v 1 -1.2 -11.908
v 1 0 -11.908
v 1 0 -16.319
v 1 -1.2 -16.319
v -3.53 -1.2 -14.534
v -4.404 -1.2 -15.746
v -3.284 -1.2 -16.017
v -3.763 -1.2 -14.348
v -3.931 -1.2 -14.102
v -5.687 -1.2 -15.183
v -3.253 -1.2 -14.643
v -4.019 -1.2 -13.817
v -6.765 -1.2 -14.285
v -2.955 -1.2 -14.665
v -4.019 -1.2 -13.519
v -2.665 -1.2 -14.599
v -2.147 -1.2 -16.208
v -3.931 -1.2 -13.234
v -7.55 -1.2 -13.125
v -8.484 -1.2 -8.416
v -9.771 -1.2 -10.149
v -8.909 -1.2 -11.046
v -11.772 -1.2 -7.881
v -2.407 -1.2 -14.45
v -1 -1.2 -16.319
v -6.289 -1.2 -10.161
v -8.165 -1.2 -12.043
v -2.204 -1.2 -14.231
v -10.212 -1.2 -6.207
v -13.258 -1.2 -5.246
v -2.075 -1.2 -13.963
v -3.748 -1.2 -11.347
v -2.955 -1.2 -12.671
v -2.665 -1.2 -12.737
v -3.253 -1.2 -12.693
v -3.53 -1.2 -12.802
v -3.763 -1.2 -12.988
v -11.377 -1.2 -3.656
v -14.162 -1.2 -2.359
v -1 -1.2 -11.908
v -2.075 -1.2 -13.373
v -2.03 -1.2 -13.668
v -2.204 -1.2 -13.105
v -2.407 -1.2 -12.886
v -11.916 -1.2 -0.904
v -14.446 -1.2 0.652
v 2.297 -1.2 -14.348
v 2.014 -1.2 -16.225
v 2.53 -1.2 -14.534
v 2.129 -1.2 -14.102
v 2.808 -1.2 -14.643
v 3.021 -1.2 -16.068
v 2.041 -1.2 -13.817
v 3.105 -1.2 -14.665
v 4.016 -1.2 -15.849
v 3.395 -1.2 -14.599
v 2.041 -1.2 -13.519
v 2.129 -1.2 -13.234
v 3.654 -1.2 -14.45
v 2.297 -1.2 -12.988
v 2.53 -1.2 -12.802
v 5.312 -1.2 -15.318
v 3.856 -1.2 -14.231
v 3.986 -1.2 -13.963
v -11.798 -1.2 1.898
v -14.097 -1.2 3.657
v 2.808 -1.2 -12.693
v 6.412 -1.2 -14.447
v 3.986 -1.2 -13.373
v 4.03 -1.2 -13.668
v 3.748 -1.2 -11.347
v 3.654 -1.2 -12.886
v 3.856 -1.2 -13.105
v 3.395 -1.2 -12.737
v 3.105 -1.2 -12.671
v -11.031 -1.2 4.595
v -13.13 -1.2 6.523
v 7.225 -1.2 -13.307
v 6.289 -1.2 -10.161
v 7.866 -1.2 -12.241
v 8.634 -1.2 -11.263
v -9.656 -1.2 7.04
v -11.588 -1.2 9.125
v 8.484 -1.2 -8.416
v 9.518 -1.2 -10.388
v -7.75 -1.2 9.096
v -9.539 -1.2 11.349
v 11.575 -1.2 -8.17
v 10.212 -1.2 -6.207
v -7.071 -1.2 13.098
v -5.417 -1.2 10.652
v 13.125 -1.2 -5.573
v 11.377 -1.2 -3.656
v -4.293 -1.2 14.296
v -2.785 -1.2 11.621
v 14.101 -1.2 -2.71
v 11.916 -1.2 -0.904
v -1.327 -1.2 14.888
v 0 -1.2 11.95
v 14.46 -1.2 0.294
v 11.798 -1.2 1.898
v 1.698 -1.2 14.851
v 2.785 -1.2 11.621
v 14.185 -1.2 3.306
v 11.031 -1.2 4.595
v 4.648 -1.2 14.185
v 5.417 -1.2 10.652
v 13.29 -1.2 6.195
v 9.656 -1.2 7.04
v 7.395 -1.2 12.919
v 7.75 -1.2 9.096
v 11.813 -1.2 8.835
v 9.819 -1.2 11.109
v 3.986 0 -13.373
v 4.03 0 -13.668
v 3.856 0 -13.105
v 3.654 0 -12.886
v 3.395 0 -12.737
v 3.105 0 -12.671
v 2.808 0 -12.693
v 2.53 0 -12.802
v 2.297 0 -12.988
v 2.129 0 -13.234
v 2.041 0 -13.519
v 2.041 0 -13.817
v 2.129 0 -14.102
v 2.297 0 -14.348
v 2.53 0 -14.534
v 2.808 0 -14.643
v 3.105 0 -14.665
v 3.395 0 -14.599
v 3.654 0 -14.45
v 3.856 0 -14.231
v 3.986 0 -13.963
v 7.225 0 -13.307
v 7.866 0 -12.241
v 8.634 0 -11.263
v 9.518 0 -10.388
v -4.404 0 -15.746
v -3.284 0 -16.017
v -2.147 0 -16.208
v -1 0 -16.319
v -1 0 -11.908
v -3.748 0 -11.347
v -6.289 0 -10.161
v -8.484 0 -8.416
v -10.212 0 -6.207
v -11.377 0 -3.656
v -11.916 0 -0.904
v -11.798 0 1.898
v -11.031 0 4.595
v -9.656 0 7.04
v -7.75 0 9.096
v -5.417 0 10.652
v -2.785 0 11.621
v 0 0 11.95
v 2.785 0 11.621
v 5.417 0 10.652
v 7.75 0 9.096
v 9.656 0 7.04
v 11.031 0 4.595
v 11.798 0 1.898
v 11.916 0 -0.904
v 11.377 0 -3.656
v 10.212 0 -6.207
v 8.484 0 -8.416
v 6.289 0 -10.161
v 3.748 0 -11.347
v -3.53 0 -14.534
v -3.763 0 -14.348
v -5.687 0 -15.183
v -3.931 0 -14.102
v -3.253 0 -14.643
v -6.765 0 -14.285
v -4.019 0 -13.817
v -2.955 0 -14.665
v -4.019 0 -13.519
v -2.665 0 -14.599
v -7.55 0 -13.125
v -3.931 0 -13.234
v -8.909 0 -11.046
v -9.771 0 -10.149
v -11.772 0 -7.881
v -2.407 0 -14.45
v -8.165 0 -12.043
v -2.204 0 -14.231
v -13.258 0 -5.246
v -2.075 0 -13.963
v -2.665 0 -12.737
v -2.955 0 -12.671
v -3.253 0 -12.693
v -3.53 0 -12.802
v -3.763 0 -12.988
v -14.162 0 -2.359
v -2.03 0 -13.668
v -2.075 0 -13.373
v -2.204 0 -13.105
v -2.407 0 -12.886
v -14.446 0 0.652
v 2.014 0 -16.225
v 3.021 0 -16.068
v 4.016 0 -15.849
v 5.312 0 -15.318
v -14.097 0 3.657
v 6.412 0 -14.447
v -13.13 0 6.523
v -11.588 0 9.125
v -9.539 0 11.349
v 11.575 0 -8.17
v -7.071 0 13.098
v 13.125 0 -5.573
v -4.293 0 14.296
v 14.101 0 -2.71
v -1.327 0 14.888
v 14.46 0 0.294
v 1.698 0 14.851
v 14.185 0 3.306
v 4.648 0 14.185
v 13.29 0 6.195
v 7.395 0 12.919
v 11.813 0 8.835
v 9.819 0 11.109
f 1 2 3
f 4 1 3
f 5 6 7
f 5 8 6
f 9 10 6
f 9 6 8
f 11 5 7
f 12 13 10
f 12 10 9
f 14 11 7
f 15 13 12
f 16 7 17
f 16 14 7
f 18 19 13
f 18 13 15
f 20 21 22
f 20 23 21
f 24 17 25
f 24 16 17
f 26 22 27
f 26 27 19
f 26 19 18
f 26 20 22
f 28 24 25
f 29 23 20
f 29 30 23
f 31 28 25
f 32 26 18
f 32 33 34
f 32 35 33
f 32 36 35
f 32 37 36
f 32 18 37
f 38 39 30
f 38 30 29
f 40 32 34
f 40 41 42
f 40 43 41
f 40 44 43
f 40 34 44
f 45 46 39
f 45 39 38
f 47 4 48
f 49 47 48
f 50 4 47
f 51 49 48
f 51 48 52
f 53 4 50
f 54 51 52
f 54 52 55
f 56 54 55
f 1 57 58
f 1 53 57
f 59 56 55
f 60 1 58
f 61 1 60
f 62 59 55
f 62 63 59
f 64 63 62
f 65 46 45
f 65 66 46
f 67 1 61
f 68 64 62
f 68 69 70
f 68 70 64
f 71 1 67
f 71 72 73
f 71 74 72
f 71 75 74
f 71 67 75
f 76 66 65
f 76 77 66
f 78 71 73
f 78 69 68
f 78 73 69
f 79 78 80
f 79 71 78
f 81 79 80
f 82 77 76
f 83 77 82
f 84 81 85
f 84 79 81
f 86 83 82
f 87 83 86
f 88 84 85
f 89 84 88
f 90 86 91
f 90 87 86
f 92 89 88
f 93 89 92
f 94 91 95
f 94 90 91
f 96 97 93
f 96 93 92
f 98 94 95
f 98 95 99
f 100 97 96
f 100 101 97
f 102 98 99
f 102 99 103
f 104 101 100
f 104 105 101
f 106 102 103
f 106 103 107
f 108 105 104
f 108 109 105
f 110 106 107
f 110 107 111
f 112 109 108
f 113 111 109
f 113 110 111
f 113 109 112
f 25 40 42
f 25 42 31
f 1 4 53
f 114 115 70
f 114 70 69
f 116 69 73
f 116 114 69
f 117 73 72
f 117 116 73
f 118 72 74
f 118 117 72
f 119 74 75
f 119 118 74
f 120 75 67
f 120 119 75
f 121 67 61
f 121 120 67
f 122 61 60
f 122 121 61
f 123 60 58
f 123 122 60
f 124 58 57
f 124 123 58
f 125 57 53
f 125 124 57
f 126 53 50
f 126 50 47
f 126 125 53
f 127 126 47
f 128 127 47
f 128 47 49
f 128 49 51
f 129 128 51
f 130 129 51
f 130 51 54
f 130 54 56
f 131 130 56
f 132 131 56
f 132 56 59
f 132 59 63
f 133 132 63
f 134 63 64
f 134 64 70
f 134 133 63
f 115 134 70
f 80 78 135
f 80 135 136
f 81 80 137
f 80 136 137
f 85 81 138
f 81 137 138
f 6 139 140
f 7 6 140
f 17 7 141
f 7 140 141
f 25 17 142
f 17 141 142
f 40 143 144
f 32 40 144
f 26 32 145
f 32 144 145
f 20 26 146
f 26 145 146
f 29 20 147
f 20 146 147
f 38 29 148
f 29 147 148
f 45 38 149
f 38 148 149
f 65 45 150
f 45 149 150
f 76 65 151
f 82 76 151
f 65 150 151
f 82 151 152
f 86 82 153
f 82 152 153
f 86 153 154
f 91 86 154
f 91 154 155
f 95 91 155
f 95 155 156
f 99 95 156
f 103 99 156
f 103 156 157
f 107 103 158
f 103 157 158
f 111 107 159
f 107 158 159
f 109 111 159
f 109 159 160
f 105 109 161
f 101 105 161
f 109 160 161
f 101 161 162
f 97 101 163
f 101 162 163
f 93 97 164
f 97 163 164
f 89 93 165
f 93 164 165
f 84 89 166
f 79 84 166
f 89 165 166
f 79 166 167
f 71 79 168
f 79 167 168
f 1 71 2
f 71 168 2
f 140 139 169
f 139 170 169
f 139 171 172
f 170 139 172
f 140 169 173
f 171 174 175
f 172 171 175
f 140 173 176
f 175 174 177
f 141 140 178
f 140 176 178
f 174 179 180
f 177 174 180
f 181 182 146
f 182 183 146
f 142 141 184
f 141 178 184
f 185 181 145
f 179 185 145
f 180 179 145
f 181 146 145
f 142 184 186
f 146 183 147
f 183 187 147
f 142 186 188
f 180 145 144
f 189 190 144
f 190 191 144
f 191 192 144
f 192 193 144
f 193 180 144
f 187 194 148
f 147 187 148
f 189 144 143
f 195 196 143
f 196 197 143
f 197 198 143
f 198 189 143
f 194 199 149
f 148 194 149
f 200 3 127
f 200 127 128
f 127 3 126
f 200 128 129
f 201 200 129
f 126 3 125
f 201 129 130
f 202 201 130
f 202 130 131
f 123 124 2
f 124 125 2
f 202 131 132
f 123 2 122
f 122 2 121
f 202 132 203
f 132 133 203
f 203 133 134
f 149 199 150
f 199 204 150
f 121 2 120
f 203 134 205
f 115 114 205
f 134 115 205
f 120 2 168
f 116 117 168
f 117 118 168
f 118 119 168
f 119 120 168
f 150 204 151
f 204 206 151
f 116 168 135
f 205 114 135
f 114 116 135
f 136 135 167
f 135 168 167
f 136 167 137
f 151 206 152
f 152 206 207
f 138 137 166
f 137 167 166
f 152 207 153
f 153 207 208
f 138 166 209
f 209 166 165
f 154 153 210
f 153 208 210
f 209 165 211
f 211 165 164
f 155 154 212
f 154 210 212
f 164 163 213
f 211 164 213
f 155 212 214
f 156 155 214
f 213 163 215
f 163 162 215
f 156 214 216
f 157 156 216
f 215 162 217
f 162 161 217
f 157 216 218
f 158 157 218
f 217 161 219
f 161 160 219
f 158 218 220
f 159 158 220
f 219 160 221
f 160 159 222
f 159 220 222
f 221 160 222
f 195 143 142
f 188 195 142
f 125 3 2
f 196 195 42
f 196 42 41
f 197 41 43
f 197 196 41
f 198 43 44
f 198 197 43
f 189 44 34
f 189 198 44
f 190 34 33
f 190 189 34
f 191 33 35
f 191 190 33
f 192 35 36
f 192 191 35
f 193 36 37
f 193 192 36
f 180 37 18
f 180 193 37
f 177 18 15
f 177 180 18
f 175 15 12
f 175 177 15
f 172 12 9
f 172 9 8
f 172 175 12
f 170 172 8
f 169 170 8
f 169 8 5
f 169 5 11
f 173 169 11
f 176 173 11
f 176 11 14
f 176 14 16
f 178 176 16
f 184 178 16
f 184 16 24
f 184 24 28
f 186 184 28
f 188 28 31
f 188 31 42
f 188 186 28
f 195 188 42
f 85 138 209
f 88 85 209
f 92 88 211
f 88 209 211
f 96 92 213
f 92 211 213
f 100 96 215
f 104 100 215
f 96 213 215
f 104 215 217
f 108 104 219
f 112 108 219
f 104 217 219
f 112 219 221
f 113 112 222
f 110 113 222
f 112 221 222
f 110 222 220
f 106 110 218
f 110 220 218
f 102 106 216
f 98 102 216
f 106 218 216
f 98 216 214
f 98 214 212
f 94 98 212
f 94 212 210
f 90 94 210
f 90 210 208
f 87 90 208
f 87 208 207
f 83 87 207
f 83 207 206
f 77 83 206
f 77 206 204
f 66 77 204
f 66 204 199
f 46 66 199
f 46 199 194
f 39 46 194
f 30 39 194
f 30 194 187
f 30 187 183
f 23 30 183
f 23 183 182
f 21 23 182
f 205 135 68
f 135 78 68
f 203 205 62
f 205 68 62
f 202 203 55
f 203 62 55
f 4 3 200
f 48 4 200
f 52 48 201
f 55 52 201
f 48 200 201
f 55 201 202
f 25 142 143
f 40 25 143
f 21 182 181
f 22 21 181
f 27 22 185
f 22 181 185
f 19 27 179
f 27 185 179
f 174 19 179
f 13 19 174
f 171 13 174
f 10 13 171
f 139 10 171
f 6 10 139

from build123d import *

# Parameters (mm, degrees)
F0_R        = 1
F1_DEPTH    = 1.2
F2_T1_DEPTH = 1.2
F3_R        = 5


# Not quite as in the source:
# - a fillet or chamfer that OpenCascade refuses, or shapes differently, is made with other operations: its cross-section is extruded or revolved along the edge and cut away or added


with BuildPart() as f1:
    # F0 (on Front) → F1 (new body)
    with BuildSketch(Plane.XZ):
        with BuildLine():
            ThreePointArc((-1, -11.9080854884), (0, 11.95), (1, -11.9080854884))
            Line((1, -11.9080854884), (1, -16.3193903072))
            ThreePointArc((1, -16.3193903072), (3.8276067146, -15.8956574837), (6.5381625357, -14.9858243236))
            Line((6.5381625357, -14.9858243236), (5.5446488339, -12.8552273145))
            ThreePointArc((5.5446488339, -12.8552273145), (0.2154334831, 14.9485032399), (-5.9128007498, -12.6901058819))
            Line((-5.9128007498, -12.6901058819), (-6.90530659, -14.8202307977))
            ThreePointArc((-6.90530659, -14.8202307977), (-4.0231005306, -15.8473077247), (-1, -16.3193903072))
            Line((-1, -16.3193903072), (-1, -11.9080854884))
        make_face()
        with Locations((-3.0301545951, -13.6681440997)):
            Circle(F0_R, mode=Mode.SUBTRACT)
        with Locations((3.0301545951, -13.6681440997)):
            Circle(F0_R, mode=Mode.SUBTRACT)
    extrude(amount=F1_DEPTH)

    # F2: fillet of radius 10 on 2 edges, made by hand

    # F2_s2 → F2_t1 (join)
    with BuildSketch(Plane.XZ):
        with BuildLine():
            ThreePointArc((-9.7709471746, -10.1486206785), (-8.0118480734, -12.2842810829), (-6.90530659, -14.8202307977))
            Line((-6.90530659, -14.8202307977), (-5.9128007498, -12.6901058819))
            ThreePointArc((-5.9128007498, -12.6901058819), (-7.9440740778, -11.5745099677), (-9.7709471746, -10.1486206785))
        make_face()
        with BuildLine():
            ThreePointArc((6.5381625357, -14.9858243236), (7.7071981674, -12.4786621044), (9.5183975603, -10.3877141232))
            ThreePointArc((9.5183975603, -10.3877141232), (7.6320006174, -11.7832822229), (5.5446488339, -12.8552273145))
            Line((5.5446488339, -12.8552273145), (6.5381625357, -14.9858243236))
        make_face()
    extrude(amount=F2_T1_DEPTH)

    # F3
    f3_edges = [f1.edges().sort_by_distance(p)[0] for p in [
        (-6.905307, -0.6, -14.820231),
        (6.538163, -0.6, -14.985824),
    ]]
    fillet(f3_edges, radius=F3_R)


solid = f1.part
